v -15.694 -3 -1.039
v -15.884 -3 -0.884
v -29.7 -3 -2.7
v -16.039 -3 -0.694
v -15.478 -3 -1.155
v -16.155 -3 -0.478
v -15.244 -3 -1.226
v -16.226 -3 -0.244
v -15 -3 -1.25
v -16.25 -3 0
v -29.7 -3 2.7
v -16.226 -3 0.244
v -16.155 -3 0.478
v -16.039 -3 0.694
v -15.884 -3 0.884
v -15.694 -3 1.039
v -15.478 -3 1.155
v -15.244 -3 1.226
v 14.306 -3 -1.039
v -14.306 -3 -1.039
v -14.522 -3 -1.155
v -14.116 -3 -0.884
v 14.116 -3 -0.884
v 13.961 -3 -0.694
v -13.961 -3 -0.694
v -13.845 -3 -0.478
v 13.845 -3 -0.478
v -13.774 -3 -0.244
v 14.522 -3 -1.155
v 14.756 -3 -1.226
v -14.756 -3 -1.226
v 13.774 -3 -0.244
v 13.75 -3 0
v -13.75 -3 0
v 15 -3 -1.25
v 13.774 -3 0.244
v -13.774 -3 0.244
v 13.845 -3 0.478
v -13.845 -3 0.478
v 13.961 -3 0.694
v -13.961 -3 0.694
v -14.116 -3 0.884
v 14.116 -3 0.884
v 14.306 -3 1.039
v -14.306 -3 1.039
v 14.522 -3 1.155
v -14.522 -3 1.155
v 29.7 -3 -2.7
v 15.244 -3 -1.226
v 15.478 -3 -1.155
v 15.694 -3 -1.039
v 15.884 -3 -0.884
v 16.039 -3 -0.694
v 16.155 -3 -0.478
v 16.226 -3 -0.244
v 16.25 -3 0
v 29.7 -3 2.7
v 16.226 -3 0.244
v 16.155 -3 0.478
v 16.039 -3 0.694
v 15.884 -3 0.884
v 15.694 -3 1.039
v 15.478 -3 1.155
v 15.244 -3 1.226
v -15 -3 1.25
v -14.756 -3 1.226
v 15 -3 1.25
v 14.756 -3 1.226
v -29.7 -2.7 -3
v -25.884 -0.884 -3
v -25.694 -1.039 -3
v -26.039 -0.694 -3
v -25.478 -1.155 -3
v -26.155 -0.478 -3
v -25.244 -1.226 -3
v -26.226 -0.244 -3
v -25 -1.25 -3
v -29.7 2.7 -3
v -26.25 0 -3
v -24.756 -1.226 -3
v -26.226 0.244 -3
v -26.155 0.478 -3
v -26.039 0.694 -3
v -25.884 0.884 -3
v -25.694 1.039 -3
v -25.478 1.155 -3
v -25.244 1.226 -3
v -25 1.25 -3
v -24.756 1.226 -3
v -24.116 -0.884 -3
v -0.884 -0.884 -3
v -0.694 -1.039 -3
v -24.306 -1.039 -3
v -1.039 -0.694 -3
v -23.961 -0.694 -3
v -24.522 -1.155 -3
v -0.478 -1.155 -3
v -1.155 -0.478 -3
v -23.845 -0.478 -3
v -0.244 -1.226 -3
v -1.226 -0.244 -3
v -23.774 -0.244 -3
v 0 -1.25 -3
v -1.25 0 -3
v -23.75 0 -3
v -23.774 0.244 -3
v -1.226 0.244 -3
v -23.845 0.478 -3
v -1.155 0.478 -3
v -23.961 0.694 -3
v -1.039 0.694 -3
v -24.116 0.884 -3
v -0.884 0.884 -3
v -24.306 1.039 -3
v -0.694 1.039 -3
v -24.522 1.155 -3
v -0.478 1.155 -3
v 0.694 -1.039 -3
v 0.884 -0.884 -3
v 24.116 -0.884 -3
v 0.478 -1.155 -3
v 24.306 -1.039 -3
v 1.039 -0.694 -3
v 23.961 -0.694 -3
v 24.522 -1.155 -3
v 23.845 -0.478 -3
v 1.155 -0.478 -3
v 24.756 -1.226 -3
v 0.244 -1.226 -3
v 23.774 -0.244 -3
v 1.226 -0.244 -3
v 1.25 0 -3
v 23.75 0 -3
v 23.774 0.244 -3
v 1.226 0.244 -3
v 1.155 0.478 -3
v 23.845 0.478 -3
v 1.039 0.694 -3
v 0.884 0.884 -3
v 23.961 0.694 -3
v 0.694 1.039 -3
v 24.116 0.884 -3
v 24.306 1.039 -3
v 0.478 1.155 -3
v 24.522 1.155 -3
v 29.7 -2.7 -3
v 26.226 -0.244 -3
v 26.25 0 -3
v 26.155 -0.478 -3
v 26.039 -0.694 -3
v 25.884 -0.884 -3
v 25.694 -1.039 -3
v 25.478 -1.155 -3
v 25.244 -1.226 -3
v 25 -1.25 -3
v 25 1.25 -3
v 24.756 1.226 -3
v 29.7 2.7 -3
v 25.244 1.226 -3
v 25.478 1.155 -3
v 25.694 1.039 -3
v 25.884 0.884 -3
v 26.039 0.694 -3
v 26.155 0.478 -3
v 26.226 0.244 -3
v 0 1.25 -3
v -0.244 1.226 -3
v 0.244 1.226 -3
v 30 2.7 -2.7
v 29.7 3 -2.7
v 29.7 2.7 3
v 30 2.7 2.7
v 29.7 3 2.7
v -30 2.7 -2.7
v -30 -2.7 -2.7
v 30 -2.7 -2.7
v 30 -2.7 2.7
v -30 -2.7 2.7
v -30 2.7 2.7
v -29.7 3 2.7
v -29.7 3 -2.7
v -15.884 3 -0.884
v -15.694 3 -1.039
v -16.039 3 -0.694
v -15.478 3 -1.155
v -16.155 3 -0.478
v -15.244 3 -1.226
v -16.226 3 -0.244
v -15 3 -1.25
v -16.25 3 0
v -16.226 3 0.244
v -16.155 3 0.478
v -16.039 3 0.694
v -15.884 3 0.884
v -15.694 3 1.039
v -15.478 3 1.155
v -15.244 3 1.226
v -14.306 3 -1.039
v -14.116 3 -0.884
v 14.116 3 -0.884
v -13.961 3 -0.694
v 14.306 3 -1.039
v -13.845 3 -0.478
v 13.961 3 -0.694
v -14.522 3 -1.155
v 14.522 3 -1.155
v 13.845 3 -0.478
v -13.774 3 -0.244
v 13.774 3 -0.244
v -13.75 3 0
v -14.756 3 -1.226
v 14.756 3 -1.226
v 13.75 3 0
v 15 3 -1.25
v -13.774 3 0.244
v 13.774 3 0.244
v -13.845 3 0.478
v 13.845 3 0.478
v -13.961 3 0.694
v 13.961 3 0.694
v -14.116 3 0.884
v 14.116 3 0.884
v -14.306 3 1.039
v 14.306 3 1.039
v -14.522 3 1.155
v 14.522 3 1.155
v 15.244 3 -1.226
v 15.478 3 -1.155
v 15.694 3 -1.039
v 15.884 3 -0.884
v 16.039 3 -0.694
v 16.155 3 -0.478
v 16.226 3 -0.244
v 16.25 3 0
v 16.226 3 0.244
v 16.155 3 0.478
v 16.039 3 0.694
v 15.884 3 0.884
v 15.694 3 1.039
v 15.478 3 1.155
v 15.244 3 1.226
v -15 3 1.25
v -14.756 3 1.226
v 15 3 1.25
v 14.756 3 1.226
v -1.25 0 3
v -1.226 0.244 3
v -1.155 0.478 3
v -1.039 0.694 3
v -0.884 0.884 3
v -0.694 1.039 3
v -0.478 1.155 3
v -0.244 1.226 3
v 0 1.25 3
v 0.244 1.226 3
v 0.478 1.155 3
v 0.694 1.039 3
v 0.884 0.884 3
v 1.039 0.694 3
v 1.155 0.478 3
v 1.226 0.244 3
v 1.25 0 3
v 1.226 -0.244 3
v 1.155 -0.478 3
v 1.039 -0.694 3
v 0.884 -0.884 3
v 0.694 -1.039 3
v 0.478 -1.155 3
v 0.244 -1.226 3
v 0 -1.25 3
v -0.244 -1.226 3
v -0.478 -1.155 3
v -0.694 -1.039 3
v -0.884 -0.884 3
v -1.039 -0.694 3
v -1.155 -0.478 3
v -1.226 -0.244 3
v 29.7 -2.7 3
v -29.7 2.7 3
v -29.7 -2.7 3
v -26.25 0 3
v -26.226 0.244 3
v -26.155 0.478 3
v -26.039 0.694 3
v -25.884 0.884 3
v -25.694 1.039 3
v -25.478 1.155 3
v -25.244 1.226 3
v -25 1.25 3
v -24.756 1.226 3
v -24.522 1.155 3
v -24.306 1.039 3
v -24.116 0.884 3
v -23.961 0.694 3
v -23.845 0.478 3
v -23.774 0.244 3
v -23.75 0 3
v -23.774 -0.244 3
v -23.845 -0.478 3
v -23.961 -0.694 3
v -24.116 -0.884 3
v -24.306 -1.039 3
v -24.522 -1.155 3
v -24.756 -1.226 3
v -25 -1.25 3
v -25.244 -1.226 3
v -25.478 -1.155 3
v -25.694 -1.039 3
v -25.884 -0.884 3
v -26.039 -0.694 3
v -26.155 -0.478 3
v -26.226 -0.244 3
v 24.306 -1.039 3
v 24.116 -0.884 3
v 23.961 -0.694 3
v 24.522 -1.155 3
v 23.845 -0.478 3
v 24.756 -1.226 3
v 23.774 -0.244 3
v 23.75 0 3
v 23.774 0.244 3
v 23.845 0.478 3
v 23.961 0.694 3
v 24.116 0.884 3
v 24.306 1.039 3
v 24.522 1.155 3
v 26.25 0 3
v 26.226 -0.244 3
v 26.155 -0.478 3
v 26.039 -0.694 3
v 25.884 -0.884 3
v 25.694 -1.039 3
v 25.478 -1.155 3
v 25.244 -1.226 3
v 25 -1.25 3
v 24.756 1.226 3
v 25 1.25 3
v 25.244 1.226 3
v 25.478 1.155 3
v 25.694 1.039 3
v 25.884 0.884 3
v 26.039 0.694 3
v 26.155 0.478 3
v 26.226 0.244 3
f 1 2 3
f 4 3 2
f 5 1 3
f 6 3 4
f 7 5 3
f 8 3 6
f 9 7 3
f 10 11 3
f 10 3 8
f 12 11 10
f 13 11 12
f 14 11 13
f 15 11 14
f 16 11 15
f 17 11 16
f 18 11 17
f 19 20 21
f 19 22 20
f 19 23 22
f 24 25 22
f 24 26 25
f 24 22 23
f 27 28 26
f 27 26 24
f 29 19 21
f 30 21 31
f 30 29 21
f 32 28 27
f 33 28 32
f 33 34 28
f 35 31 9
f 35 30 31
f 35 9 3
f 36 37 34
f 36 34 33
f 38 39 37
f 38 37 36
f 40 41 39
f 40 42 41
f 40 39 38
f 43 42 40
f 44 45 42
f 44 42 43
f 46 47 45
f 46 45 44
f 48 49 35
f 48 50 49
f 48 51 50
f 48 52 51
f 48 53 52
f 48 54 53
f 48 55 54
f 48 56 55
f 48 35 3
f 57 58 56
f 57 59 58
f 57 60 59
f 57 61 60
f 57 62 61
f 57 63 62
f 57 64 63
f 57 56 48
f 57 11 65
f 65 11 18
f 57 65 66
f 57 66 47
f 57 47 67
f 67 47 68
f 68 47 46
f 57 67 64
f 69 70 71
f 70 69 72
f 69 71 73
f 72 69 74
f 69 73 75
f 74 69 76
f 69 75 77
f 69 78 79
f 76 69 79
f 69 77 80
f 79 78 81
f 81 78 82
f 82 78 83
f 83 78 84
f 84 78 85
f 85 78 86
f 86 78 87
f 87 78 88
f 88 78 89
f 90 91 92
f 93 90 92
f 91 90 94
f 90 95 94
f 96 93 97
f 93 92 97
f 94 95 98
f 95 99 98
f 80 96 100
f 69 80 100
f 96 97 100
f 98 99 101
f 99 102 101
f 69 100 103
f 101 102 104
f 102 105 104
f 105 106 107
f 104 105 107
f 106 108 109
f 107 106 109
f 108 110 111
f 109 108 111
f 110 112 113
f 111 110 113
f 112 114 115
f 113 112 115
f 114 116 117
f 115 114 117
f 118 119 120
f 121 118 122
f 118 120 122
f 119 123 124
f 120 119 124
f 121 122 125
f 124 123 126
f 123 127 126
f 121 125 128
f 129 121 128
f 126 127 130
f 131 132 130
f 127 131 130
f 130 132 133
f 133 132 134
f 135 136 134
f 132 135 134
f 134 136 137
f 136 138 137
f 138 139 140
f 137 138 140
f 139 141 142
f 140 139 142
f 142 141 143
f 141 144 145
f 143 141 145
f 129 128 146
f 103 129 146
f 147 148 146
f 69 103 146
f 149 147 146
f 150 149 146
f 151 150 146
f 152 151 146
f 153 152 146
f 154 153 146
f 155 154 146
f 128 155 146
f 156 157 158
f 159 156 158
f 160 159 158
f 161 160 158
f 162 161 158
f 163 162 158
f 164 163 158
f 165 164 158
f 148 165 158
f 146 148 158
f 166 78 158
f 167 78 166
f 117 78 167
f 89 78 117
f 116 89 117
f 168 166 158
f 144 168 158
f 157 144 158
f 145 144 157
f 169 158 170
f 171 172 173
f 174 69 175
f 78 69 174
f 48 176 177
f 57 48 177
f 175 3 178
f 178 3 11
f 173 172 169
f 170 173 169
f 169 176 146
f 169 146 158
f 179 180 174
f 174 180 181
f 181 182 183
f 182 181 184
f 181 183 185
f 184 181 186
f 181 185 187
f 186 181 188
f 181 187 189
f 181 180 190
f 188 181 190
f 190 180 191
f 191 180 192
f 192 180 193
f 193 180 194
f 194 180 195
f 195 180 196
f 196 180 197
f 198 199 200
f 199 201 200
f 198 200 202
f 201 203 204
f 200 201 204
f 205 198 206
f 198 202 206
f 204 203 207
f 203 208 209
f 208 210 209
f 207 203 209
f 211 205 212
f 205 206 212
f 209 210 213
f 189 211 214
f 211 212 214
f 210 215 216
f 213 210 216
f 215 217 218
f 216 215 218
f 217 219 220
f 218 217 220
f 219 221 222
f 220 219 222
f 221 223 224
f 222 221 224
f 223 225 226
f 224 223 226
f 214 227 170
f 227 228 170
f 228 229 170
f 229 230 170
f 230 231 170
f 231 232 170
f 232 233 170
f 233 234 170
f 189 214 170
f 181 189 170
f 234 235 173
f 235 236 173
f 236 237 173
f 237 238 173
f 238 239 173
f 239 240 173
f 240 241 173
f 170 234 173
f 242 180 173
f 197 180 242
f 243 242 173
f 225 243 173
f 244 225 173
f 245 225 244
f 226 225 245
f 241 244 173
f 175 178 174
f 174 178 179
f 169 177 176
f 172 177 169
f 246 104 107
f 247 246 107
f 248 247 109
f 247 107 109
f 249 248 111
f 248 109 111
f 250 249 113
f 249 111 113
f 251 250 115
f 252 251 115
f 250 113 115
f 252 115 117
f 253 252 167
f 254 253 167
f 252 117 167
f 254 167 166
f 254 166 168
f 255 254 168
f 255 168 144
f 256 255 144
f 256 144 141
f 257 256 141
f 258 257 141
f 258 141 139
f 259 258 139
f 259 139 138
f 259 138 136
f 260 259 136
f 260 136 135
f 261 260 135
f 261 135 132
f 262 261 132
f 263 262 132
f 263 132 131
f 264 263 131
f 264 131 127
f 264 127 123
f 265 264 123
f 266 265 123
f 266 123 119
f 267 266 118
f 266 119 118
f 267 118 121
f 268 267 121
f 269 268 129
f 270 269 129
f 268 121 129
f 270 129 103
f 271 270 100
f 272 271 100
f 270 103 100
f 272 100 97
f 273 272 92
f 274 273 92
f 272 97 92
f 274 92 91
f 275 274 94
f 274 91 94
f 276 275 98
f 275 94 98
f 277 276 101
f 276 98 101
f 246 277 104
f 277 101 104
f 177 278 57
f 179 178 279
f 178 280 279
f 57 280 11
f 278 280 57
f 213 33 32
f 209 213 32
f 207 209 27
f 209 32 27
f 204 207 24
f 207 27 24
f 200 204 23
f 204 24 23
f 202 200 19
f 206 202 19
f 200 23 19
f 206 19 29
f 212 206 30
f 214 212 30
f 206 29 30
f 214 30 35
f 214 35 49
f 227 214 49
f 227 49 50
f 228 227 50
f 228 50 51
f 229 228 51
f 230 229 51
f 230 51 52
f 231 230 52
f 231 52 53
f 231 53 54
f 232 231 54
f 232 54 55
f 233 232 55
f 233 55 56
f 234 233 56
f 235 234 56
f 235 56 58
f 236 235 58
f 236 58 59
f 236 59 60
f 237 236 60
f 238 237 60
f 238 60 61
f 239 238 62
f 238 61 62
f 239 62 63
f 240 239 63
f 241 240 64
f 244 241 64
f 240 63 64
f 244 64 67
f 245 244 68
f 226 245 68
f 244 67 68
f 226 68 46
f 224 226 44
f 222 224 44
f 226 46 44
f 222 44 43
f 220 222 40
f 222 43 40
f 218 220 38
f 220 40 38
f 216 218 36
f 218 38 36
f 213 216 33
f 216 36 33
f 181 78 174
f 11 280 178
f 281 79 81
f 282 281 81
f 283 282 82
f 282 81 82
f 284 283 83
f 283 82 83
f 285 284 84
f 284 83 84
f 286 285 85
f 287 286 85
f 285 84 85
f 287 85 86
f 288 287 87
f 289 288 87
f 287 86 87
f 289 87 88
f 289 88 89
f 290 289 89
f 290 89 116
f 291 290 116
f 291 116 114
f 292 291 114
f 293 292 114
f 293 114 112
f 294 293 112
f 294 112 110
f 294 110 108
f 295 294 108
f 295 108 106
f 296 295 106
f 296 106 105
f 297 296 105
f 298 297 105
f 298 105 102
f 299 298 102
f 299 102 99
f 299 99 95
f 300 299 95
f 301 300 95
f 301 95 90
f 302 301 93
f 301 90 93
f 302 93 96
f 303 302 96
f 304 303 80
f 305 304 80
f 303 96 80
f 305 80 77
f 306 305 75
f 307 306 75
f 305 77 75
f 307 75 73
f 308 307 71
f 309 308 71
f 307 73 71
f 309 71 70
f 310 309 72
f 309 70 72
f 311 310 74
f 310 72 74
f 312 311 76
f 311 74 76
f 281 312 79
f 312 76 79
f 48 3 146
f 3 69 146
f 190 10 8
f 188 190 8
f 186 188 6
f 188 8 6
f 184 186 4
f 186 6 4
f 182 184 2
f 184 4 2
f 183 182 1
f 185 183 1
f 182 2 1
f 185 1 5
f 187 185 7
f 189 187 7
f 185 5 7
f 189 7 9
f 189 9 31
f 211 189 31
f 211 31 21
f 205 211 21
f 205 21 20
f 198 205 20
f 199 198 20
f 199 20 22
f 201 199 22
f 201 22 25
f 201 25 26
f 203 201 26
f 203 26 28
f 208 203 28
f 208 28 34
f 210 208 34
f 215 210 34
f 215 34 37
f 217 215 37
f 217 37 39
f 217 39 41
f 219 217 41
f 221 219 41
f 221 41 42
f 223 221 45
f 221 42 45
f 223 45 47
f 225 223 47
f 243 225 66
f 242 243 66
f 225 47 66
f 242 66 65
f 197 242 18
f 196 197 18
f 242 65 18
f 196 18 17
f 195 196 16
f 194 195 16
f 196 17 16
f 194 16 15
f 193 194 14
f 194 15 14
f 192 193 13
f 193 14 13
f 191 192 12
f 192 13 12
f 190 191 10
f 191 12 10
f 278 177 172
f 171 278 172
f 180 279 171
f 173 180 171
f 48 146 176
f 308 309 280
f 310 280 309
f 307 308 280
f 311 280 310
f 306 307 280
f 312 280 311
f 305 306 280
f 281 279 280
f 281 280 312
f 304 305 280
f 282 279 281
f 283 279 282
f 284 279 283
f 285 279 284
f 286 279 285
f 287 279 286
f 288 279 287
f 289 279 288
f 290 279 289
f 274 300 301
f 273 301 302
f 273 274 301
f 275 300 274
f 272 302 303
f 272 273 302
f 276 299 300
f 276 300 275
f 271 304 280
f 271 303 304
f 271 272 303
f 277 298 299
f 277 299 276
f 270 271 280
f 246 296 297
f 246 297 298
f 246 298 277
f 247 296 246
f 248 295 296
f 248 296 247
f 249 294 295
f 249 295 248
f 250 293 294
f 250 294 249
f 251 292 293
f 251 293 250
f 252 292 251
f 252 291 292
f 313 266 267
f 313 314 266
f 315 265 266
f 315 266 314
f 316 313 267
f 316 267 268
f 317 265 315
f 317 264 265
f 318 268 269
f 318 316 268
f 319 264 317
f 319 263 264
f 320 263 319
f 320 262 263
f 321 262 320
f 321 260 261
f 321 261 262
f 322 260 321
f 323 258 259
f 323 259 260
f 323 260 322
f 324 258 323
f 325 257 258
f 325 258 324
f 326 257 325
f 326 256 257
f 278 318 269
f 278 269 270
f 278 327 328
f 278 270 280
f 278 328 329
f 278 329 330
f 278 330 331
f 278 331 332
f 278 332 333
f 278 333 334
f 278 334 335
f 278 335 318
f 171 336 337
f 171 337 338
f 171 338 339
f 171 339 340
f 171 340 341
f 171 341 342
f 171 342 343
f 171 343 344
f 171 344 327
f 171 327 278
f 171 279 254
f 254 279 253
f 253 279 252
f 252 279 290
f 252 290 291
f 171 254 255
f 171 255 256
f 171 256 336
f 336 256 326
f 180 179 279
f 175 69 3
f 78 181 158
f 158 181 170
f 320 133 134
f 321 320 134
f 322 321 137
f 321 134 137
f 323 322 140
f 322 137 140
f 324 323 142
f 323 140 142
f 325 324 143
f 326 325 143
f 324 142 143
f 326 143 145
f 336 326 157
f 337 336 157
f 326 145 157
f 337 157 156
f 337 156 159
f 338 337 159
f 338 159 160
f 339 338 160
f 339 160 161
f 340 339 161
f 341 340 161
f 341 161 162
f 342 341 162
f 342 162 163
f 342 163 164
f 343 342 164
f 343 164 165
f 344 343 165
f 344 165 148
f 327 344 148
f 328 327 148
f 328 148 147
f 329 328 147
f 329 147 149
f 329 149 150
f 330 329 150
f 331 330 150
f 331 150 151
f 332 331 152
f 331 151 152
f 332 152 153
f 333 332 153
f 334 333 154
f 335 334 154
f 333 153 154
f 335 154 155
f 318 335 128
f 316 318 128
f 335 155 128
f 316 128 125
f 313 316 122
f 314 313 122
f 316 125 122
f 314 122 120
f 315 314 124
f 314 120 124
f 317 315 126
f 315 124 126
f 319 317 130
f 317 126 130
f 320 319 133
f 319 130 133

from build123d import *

# Parameters (mm, degrees)
SKETCH_1_W         = 60
SKETCH_1_H         = 6
EXTRUDE_1_DEPTH    = 3
HOLE_WIZARD_M3_1_D = 2.5
HOLE_WIZARD_M3_2_D = 2.5
CHAMFER_1_SIZE     = 0.3


with BuildPart() as part:
    # 草图1 → 凸台-拉伸1 (new, symmetric)
    with BuildSketch(Plane.XY):
        Rectangle(SKETCH_1_W, SKETCH_1_H)
    extrude(amount=EXTRUDE_1_DEPTH, both=True)

    # M3 螺纹孔1 (through all)
    with Locations(Plane.XY.offset(3)):
        with Locations((-25, 0), (0, 0), (25, 0)):
            Hole(HOLE_WIZARD_M3_1_D / 2)

    # M3 螺纹孔2 (through all)
    with Locations(Plane(origin=(0, 3, 0), x_dir=(1, 0, 0), z_dir=(0, 1, 0))):
        with Locations((-15, 0), (15, 0)):
            Hole(HOLE_WIZARD_M3_2_D / 2)

    # 倒角1
    chamfer_1_edges = [part.edges().sort_by_distance(p)[0] for p in [
        (-30, 0, 3),
        (0, -3, 3),
        (30, 0, 3),
        (0, -3, -3),
        (-30, 0, -3),
        (0, 3, -3),
        (30, 0, -3),
        (30, -3, 0),
        (-30, -3, 0),
        (-30, 3, 0),
        (30, 3, 0),
        (0, 3, 3),
    ]]
    chamfer(chamfer_1_edges, length=CHAMFER_1_SIZE)


solid = part.part
